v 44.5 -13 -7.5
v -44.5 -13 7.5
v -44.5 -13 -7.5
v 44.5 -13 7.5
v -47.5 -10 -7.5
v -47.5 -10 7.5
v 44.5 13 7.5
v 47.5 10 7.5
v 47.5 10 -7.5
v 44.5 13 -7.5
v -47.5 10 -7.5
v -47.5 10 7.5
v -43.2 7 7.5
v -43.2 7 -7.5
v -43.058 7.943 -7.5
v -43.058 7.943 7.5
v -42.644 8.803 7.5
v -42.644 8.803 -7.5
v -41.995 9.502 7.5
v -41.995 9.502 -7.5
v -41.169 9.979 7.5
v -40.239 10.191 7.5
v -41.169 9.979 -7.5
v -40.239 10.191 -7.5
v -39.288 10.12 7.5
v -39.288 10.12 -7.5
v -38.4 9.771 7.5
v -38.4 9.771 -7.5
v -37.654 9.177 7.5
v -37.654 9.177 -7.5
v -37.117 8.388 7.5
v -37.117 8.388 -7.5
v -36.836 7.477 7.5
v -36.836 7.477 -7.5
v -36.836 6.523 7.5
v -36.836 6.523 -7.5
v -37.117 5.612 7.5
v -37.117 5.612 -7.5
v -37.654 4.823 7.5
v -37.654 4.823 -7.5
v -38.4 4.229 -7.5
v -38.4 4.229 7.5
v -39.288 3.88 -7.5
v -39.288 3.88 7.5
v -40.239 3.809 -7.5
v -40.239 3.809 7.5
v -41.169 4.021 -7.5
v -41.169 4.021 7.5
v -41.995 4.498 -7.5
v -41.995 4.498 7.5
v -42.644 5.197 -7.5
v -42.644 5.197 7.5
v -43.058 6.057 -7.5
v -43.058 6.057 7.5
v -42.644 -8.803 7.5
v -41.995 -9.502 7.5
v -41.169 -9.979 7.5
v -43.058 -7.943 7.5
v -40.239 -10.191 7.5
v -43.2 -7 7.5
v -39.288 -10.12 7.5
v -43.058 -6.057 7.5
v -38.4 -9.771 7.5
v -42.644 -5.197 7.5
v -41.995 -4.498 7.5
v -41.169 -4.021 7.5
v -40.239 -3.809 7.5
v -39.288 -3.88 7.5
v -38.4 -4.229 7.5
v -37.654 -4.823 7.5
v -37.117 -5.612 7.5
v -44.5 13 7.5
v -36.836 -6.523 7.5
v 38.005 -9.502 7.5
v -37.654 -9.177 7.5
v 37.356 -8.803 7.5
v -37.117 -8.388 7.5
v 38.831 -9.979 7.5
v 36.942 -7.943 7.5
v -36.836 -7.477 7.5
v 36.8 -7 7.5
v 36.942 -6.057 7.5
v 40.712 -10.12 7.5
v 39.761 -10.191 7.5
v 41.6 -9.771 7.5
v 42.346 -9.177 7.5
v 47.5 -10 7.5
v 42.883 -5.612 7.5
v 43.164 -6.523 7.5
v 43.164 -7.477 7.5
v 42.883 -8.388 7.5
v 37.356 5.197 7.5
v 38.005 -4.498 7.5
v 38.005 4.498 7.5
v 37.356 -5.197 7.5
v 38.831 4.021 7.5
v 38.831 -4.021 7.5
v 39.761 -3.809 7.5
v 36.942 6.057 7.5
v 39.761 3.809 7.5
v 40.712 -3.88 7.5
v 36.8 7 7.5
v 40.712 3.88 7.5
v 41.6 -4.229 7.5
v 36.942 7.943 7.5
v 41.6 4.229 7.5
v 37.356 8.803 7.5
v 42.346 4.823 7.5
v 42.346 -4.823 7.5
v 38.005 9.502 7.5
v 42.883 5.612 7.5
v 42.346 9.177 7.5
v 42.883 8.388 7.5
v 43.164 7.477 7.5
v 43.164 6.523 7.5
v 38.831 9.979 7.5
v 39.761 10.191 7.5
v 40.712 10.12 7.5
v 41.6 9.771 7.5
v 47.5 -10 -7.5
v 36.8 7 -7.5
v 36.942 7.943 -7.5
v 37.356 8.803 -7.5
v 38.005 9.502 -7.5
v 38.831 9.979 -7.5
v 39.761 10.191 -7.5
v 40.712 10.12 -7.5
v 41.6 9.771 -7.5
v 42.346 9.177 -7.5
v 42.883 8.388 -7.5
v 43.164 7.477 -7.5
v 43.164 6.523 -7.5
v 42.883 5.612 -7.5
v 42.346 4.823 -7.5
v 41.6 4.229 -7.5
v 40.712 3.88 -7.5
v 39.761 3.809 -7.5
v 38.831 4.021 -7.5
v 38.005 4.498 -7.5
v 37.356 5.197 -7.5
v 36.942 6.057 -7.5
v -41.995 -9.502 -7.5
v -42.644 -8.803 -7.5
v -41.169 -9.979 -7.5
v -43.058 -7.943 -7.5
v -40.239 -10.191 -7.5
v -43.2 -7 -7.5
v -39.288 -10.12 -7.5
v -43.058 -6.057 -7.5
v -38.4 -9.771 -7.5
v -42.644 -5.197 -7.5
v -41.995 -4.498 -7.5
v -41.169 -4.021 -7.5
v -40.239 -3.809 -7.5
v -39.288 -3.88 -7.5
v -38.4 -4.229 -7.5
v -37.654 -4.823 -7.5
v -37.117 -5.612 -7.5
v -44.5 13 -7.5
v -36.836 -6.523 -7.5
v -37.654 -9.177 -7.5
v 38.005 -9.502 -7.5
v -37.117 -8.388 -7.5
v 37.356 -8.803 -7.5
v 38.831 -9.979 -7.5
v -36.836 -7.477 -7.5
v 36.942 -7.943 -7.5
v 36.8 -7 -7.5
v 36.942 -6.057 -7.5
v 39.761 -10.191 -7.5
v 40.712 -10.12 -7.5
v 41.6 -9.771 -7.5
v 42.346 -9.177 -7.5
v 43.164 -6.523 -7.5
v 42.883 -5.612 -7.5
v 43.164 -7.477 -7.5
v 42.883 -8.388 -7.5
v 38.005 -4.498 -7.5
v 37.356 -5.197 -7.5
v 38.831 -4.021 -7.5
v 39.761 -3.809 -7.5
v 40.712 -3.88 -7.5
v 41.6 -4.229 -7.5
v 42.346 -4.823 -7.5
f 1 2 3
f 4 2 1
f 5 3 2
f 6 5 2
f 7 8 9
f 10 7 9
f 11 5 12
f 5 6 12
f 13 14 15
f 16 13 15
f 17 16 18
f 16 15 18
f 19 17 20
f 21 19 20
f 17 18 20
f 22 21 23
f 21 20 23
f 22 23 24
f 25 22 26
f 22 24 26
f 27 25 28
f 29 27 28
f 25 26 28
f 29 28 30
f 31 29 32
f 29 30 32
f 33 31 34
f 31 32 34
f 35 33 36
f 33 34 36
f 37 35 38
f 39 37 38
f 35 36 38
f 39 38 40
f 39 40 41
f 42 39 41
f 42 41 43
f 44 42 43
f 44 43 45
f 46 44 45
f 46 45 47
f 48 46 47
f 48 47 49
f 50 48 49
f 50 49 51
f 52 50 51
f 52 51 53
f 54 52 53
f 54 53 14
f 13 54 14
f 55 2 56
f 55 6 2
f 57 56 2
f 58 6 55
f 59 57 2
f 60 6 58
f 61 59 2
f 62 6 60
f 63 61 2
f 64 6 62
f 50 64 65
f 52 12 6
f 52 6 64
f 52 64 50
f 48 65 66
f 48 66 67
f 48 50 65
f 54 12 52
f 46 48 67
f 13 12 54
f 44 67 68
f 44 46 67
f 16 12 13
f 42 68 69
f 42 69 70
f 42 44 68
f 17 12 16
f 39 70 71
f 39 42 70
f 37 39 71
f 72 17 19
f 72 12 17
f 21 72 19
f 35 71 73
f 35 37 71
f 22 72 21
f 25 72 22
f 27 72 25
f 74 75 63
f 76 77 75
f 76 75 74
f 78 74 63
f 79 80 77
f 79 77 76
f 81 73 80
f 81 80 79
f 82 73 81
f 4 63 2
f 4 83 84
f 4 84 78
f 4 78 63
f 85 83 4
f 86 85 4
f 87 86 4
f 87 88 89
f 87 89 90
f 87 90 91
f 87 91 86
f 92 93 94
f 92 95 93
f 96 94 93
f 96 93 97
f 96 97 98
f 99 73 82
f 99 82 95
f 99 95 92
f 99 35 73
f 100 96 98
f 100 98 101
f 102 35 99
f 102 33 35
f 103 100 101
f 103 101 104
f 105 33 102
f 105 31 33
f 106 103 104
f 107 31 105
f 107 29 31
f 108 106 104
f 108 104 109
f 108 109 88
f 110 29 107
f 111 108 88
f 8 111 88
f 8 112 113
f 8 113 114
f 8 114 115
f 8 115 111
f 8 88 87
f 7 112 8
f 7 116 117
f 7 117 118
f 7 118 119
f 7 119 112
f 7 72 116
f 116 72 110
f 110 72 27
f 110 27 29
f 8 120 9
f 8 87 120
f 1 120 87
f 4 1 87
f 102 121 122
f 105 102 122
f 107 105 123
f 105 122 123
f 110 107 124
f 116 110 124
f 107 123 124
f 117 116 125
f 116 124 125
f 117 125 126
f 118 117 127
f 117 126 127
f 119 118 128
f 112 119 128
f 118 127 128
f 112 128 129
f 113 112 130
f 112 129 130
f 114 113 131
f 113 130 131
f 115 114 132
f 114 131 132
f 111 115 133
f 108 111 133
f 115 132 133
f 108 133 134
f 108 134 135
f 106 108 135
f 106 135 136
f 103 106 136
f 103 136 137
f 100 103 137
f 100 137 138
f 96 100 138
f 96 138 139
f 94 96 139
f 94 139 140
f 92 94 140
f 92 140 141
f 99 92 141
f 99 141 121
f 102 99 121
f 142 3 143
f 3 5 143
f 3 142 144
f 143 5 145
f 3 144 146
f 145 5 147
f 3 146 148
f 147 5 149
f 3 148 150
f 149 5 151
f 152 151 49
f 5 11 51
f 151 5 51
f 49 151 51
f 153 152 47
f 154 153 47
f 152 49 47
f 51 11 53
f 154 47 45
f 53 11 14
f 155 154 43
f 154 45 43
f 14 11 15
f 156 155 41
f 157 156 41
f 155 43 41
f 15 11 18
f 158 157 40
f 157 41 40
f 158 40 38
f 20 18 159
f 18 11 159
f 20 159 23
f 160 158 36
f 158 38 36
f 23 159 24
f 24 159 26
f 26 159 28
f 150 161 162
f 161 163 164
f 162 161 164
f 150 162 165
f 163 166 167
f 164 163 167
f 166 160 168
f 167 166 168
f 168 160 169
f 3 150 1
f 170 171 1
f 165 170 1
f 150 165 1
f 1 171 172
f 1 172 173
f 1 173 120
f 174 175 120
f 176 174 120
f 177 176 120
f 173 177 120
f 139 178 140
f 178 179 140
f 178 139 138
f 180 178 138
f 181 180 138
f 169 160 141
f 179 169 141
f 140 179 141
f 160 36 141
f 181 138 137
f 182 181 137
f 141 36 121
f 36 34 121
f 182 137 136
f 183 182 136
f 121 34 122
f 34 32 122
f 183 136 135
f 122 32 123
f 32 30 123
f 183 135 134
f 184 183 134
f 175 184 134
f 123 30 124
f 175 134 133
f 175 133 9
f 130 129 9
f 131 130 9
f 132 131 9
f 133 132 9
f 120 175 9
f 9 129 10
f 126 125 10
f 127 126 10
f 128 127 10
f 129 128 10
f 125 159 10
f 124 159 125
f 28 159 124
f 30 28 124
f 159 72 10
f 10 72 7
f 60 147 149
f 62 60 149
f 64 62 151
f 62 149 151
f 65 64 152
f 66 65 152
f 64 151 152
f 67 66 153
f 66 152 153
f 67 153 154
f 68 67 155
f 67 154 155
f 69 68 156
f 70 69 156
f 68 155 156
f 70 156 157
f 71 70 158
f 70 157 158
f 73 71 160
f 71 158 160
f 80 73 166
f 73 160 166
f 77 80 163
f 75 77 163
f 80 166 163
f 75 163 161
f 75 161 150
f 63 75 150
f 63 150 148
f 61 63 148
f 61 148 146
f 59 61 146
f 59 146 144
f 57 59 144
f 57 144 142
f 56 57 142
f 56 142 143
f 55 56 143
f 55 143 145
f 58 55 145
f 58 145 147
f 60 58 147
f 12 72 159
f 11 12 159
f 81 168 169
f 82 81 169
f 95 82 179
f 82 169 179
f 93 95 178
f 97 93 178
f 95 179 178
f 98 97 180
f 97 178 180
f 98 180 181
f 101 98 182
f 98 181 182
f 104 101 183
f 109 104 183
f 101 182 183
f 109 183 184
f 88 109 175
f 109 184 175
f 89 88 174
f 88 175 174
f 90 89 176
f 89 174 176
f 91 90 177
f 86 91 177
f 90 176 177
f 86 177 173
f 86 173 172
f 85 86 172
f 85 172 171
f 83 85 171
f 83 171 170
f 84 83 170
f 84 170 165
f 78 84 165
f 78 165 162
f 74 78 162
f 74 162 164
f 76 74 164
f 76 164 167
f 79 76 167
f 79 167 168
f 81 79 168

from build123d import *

# Parameters (mm, degrees)
F0_W     = 95
F0_H     = 26
F1_DEPTH = 7.5
F3_D     = 6.4
F4_SIZE  = 3


with BuildPart() as f1:
    # F0 (on Top) → F1 (new body, symmetric)
    with BuildSketch(Plane.XY):
        Rectangle(F0_W, F0_H)
    extrude(amount=F1_DEPTH, both=True)

    # F3 (through all)
    with Locations(Plane.XY.offset(7.5)):
        with Locations((-40, 7), (-40, -7), (40, 7), (40, -7)):
            Hole(F3_D / 2)

    # F4
    f4_edges = [f1.edges().sort_by_distance(p)[0] for p in [
        (-47.5, 13, 0),
        (47.5, 13, 0),
        (47.5, -13, 0),
        (-47.5, -13, 0),
    ]]
    chamfer(f4_edges, length=F4_SIZE)


solid = f1.part
